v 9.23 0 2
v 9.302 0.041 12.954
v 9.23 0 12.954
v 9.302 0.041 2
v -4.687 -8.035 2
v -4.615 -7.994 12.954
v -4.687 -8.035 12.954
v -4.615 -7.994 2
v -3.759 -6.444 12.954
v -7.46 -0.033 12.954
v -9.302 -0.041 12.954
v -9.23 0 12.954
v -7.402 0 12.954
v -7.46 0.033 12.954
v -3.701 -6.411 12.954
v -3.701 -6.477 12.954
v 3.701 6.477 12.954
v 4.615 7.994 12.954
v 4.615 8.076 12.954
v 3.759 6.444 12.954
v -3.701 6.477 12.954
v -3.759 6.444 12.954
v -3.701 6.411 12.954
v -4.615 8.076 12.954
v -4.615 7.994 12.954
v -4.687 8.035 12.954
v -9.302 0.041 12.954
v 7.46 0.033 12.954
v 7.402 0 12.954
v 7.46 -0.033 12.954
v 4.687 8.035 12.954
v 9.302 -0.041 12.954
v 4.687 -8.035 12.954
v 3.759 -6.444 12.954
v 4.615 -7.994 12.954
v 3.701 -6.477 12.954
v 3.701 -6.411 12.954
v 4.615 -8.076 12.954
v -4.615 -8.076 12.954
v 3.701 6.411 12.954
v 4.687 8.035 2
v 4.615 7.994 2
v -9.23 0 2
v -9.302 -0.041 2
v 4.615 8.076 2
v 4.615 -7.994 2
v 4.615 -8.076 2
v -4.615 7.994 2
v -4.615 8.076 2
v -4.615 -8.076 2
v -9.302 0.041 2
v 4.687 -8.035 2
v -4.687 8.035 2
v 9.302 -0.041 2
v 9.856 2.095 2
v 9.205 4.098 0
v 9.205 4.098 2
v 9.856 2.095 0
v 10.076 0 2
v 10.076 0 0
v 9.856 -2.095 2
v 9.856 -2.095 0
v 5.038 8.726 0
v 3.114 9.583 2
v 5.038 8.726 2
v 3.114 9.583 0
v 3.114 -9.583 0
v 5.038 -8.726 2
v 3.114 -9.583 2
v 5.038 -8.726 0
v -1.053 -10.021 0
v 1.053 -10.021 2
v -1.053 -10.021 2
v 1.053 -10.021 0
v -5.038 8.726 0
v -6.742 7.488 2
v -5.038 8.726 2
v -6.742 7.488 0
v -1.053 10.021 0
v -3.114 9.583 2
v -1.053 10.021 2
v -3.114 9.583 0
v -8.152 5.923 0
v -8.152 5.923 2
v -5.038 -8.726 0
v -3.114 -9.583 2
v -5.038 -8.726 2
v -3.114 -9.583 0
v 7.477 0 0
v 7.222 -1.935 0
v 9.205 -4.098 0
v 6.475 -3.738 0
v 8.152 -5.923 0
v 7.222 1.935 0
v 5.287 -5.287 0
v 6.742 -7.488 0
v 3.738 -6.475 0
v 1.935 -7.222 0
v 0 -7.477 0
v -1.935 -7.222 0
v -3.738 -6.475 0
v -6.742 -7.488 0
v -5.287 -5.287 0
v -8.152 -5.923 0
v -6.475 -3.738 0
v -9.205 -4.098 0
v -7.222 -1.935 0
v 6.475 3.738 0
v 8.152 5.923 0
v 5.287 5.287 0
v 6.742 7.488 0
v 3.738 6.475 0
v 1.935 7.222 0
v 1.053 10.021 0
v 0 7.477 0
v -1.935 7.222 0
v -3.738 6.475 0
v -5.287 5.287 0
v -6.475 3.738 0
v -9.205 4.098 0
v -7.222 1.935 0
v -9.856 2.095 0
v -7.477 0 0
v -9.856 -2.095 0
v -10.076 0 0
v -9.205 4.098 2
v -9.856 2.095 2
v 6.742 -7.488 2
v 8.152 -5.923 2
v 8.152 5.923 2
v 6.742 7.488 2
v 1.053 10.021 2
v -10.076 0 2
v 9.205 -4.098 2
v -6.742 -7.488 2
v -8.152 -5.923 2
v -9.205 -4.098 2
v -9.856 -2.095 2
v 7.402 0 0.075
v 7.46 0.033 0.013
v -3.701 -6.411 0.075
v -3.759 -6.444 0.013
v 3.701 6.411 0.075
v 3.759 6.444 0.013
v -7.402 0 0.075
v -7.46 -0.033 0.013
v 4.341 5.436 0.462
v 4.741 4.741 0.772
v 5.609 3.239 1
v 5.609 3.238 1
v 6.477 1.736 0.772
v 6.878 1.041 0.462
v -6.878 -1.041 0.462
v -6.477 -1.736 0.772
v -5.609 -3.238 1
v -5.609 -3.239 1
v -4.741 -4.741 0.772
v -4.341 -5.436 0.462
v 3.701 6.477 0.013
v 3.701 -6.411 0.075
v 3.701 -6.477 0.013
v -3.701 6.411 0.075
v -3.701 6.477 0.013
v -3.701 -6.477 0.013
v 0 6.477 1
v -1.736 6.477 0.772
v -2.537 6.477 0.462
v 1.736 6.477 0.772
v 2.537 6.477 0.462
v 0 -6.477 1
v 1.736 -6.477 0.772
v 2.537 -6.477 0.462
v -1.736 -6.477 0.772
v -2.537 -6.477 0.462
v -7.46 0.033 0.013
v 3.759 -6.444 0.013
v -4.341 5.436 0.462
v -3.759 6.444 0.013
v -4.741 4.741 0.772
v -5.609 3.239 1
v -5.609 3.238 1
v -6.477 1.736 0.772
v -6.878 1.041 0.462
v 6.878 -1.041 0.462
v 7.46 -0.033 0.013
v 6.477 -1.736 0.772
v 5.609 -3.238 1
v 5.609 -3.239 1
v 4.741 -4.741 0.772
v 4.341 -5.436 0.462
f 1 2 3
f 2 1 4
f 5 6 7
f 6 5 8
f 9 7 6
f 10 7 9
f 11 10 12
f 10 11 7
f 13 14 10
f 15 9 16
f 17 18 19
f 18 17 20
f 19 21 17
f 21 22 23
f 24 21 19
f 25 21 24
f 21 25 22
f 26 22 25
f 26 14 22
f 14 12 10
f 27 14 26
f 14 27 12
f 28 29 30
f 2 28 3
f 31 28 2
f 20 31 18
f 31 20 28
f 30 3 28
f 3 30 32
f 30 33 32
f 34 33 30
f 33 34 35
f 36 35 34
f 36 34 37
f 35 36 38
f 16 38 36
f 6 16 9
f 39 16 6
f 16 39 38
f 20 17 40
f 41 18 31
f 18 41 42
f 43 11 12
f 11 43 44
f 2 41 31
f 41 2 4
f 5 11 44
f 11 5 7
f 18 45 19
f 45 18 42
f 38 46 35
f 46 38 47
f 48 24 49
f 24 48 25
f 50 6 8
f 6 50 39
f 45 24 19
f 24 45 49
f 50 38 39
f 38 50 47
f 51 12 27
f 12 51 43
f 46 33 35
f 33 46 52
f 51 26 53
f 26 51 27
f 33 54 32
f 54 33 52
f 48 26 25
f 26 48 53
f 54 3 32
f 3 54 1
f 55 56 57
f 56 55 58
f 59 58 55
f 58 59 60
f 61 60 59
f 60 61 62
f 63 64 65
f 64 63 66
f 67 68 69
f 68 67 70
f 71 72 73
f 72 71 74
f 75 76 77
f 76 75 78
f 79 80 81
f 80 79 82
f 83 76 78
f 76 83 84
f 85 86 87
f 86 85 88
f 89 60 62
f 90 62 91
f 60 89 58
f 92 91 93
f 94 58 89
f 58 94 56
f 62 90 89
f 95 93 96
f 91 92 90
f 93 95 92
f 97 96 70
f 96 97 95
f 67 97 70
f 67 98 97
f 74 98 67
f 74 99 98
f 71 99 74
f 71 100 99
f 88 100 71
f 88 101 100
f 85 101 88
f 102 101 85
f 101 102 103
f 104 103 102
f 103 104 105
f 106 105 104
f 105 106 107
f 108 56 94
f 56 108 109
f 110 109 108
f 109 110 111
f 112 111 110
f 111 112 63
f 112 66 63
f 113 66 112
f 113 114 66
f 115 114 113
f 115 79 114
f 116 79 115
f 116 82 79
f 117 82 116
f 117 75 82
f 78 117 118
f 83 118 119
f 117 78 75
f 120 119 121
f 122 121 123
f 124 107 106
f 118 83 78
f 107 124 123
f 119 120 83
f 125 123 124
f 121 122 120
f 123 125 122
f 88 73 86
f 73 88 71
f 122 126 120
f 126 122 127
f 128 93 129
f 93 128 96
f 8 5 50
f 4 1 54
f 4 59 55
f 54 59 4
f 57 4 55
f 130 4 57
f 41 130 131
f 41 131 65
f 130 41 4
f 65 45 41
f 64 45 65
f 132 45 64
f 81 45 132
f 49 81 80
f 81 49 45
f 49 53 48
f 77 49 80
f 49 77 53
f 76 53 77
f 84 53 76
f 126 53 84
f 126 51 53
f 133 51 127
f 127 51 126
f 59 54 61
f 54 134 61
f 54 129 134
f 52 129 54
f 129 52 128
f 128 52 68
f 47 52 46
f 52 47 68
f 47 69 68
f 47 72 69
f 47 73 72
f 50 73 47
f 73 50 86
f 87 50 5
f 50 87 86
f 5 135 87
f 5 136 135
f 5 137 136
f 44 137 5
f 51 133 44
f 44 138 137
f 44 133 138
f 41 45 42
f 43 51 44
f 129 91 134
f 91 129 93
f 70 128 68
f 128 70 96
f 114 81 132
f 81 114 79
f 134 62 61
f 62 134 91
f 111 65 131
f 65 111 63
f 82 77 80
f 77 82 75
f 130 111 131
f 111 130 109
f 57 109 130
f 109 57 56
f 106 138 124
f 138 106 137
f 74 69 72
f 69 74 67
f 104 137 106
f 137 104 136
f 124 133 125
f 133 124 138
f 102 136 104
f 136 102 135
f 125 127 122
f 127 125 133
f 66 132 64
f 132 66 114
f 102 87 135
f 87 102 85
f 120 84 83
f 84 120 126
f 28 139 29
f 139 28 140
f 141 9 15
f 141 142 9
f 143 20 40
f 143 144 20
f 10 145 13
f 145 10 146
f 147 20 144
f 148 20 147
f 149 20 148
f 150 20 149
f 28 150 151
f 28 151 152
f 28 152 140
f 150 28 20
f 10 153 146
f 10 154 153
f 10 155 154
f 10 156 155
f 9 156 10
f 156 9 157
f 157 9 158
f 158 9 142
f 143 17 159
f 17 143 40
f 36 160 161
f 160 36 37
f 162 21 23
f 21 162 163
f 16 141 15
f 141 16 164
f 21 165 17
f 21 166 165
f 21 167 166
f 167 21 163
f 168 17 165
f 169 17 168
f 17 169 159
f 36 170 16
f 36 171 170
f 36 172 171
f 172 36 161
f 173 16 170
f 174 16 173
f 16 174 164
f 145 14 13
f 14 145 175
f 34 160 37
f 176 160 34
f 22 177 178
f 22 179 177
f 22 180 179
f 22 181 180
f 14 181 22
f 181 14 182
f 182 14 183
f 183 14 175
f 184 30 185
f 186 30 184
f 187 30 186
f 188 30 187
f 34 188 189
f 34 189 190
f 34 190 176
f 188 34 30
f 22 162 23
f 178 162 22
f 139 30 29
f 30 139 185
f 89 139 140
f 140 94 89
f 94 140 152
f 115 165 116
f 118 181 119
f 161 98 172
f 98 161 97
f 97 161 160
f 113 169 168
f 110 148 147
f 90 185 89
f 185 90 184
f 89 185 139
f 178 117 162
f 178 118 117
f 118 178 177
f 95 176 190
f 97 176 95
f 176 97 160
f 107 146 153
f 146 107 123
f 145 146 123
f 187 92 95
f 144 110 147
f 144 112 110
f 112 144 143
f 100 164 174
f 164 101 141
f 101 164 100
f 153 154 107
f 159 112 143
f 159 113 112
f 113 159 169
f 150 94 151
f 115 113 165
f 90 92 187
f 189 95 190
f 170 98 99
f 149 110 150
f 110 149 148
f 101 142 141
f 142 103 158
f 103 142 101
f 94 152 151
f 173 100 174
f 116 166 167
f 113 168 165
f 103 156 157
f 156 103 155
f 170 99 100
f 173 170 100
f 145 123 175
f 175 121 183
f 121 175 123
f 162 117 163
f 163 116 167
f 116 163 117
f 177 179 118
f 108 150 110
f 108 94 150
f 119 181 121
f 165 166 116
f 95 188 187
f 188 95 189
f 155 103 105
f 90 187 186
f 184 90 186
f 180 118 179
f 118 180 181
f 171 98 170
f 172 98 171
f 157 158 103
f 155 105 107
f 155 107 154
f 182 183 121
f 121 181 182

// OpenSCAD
// [FL_INDEX: keywords="openscad, 3d_parametric, Non_mar_Insert_for_Socket, csg_solid" | COT="Parametric OpenSCAD design from 3DCodeverse"]
// Title: Non mar Insert for Socket

//size of nut to fit in 16ths
inside16=8;
//size of socket to fit in 16ths
outside16=10;
//%shrink to allow for on inside(nut)
shrinkinside=2;
//%shrink to allow for on outside(socket) 
shrinkoutside=1.75;
heightmultiplier=1;

inside=inside16/16*25.4*(1+shrinkinside/100);
outside=outside16/16*25.4*(1+shrinkoutside/100);
th=inside*heightmultiplier;

	difference(){
		union(){
			translate([0,0,th/2])hexagon(outside,th);
			cylinder(h=2,r=(outside+4)/2);
			}
		translate([0,0,th/2-1])hexagon(inside,th+2);
		cylinder(h=1,r2=inside/2,r1=inside/2+1);
		}

module hexagon(size, height) {
  boxWidth = size/1.75;
  for (r = [-60, 0, 60]) rotate([0,0,r]) cube([boxWidth, size, height], true);
}
